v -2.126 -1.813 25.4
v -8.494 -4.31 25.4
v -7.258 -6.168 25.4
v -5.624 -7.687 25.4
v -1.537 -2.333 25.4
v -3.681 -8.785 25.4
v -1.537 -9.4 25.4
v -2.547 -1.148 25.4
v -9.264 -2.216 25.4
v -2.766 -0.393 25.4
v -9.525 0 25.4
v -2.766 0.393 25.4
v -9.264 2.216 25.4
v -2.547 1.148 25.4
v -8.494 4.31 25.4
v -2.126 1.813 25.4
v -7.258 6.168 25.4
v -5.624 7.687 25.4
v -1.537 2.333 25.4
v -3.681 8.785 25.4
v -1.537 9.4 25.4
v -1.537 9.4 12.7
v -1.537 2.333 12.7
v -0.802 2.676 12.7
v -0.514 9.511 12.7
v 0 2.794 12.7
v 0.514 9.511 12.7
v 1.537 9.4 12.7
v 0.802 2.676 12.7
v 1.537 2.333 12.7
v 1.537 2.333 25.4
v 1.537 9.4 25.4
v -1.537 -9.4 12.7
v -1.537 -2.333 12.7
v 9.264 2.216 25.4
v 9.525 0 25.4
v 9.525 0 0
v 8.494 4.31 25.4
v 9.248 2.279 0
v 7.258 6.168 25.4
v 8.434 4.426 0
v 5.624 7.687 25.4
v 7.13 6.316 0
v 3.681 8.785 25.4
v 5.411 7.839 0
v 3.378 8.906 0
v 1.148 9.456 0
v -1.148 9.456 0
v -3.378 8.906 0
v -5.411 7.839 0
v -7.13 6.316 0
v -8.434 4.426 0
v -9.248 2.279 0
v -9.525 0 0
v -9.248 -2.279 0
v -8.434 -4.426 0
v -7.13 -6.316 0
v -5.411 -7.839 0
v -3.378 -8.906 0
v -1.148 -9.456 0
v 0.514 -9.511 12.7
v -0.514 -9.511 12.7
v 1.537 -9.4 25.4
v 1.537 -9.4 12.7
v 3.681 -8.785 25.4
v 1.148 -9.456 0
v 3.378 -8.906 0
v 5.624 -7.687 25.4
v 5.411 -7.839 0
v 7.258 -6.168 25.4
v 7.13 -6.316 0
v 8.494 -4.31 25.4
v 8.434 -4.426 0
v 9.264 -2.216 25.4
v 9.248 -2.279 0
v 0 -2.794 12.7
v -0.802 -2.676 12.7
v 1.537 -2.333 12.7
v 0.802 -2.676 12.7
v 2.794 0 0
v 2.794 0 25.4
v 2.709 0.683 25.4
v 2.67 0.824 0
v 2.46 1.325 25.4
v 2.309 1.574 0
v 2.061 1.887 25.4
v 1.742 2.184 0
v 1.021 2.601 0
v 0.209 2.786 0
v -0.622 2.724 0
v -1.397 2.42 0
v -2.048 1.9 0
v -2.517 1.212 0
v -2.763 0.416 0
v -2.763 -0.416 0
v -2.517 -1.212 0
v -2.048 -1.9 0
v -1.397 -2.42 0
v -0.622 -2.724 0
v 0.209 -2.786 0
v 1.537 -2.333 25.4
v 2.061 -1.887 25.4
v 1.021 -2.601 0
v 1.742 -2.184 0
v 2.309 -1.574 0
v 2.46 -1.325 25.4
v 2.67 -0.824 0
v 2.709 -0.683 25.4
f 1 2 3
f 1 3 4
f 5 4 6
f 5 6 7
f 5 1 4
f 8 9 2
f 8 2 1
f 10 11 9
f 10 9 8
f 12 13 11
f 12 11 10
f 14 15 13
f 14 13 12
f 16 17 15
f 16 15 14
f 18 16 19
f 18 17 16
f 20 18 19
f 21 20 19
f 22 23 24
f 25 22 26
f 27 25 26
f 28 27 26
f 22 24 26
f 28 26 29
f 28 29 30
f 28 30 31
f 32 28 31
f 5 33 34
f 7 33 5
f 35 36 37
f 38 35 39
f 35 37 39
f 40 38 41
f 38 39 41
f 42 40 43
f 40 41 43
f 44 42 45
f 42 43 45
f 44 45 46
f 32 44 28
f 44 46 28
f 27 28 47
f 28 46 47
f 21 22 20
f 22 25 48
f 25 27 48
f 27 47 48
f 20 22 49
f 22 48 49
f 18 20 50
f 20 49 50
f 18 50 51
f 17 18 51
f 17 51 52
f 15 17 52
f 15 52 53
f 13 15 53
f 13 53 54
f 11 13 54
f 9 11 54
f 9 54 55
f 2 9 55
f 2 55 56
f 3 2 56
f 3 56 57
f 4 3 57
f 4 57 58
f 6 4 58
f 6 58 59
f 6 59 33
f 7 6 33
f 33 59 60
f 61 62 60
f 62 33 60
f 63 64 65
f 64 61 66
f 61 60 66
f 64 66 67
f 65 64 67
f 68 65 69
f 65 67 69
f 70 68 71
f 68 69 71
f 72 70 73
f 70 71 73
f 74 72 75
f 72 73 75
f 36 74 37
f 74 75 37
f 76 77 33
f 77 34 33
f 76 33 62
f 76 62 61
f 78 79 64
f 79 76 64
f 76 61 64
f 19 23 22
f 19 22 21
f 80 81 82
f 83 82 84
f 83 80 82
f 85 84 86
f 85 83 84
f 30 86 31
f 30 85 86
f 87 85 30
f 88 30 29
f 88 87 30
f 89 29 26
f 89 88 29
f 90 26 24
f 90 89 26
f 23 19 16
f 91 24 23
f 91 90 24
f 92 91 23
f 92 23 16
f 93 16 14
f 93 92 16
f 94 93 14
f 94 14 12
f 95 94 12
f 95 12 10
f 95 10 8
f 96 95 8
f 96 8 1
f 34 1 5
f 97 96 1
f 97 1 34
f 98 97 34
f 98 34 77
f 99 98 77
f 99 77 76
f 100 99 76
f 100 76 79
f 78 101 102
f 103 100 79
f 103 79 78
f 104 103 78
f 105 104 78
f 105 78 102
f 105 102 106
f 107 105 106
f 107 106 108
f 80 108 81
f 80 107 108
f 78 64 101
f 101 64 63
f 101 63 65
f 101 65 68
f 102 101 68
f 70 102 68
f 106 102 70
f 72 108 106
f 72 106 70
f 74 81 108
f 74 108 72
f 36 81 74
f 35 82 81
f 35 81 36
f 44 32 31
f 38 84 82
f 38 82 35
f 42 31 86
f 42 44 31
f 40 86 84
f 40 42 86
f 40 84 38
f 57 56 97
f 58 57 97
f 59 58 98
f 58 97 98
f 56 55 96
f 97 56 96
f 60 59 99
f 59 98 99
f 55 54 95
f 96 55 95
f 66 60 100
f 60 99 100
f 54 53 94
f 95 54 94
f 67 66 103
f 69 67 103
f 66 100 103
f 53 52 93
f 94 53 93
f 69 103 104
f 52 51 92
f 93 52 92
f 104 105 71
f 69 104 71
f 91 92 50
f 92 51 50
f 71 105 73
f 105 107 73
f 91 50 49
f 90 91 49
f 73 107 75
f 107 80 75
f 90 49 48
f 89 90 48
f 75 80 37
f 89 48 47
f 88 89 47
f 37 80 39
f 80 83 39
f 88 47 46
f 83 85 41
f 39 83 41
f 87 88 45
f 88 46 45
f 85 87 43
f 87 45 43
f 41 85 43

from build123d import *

# Parameters (mm, degrees)
F0_R     = 9.525
F0_R_2   = 2.794
F1_DEPTH = 25.4
F2_W     = 3.0734
F2_H     = 25.4
F3_DEPTH = 12.7
F4_DEPTH = 25.4


with BuildPart() as f1:
    # F0 (on Top) → F1 (new body)
    with BuildSketch(Plane.XY):
        Circle(F0_R)
        Circle(F0_R_2, mode=Mode.SUBTRACT)
        Circle(F0_R_2)
    extrude(amount=F1_DEPTH)

    # F2 (on Front) → F3 (cut, symmetric)
    with BuildSketch(Plane.XZ):
        with Locations((0, 25.4)):
            Rectangle(F2_W, F2_H)
    extrude(amount=F3_DEPTH, both=True, mode=Mode.SUBTRACT)

    # F0 (on Top) → F4 (cut, through all)
    with BuildSketch(Plane.XY):
        Circle(F0_R_2)
    extrude(amount=F4_DEPTH, mode=Mode.SUBTRACT)


solid = f1.part
